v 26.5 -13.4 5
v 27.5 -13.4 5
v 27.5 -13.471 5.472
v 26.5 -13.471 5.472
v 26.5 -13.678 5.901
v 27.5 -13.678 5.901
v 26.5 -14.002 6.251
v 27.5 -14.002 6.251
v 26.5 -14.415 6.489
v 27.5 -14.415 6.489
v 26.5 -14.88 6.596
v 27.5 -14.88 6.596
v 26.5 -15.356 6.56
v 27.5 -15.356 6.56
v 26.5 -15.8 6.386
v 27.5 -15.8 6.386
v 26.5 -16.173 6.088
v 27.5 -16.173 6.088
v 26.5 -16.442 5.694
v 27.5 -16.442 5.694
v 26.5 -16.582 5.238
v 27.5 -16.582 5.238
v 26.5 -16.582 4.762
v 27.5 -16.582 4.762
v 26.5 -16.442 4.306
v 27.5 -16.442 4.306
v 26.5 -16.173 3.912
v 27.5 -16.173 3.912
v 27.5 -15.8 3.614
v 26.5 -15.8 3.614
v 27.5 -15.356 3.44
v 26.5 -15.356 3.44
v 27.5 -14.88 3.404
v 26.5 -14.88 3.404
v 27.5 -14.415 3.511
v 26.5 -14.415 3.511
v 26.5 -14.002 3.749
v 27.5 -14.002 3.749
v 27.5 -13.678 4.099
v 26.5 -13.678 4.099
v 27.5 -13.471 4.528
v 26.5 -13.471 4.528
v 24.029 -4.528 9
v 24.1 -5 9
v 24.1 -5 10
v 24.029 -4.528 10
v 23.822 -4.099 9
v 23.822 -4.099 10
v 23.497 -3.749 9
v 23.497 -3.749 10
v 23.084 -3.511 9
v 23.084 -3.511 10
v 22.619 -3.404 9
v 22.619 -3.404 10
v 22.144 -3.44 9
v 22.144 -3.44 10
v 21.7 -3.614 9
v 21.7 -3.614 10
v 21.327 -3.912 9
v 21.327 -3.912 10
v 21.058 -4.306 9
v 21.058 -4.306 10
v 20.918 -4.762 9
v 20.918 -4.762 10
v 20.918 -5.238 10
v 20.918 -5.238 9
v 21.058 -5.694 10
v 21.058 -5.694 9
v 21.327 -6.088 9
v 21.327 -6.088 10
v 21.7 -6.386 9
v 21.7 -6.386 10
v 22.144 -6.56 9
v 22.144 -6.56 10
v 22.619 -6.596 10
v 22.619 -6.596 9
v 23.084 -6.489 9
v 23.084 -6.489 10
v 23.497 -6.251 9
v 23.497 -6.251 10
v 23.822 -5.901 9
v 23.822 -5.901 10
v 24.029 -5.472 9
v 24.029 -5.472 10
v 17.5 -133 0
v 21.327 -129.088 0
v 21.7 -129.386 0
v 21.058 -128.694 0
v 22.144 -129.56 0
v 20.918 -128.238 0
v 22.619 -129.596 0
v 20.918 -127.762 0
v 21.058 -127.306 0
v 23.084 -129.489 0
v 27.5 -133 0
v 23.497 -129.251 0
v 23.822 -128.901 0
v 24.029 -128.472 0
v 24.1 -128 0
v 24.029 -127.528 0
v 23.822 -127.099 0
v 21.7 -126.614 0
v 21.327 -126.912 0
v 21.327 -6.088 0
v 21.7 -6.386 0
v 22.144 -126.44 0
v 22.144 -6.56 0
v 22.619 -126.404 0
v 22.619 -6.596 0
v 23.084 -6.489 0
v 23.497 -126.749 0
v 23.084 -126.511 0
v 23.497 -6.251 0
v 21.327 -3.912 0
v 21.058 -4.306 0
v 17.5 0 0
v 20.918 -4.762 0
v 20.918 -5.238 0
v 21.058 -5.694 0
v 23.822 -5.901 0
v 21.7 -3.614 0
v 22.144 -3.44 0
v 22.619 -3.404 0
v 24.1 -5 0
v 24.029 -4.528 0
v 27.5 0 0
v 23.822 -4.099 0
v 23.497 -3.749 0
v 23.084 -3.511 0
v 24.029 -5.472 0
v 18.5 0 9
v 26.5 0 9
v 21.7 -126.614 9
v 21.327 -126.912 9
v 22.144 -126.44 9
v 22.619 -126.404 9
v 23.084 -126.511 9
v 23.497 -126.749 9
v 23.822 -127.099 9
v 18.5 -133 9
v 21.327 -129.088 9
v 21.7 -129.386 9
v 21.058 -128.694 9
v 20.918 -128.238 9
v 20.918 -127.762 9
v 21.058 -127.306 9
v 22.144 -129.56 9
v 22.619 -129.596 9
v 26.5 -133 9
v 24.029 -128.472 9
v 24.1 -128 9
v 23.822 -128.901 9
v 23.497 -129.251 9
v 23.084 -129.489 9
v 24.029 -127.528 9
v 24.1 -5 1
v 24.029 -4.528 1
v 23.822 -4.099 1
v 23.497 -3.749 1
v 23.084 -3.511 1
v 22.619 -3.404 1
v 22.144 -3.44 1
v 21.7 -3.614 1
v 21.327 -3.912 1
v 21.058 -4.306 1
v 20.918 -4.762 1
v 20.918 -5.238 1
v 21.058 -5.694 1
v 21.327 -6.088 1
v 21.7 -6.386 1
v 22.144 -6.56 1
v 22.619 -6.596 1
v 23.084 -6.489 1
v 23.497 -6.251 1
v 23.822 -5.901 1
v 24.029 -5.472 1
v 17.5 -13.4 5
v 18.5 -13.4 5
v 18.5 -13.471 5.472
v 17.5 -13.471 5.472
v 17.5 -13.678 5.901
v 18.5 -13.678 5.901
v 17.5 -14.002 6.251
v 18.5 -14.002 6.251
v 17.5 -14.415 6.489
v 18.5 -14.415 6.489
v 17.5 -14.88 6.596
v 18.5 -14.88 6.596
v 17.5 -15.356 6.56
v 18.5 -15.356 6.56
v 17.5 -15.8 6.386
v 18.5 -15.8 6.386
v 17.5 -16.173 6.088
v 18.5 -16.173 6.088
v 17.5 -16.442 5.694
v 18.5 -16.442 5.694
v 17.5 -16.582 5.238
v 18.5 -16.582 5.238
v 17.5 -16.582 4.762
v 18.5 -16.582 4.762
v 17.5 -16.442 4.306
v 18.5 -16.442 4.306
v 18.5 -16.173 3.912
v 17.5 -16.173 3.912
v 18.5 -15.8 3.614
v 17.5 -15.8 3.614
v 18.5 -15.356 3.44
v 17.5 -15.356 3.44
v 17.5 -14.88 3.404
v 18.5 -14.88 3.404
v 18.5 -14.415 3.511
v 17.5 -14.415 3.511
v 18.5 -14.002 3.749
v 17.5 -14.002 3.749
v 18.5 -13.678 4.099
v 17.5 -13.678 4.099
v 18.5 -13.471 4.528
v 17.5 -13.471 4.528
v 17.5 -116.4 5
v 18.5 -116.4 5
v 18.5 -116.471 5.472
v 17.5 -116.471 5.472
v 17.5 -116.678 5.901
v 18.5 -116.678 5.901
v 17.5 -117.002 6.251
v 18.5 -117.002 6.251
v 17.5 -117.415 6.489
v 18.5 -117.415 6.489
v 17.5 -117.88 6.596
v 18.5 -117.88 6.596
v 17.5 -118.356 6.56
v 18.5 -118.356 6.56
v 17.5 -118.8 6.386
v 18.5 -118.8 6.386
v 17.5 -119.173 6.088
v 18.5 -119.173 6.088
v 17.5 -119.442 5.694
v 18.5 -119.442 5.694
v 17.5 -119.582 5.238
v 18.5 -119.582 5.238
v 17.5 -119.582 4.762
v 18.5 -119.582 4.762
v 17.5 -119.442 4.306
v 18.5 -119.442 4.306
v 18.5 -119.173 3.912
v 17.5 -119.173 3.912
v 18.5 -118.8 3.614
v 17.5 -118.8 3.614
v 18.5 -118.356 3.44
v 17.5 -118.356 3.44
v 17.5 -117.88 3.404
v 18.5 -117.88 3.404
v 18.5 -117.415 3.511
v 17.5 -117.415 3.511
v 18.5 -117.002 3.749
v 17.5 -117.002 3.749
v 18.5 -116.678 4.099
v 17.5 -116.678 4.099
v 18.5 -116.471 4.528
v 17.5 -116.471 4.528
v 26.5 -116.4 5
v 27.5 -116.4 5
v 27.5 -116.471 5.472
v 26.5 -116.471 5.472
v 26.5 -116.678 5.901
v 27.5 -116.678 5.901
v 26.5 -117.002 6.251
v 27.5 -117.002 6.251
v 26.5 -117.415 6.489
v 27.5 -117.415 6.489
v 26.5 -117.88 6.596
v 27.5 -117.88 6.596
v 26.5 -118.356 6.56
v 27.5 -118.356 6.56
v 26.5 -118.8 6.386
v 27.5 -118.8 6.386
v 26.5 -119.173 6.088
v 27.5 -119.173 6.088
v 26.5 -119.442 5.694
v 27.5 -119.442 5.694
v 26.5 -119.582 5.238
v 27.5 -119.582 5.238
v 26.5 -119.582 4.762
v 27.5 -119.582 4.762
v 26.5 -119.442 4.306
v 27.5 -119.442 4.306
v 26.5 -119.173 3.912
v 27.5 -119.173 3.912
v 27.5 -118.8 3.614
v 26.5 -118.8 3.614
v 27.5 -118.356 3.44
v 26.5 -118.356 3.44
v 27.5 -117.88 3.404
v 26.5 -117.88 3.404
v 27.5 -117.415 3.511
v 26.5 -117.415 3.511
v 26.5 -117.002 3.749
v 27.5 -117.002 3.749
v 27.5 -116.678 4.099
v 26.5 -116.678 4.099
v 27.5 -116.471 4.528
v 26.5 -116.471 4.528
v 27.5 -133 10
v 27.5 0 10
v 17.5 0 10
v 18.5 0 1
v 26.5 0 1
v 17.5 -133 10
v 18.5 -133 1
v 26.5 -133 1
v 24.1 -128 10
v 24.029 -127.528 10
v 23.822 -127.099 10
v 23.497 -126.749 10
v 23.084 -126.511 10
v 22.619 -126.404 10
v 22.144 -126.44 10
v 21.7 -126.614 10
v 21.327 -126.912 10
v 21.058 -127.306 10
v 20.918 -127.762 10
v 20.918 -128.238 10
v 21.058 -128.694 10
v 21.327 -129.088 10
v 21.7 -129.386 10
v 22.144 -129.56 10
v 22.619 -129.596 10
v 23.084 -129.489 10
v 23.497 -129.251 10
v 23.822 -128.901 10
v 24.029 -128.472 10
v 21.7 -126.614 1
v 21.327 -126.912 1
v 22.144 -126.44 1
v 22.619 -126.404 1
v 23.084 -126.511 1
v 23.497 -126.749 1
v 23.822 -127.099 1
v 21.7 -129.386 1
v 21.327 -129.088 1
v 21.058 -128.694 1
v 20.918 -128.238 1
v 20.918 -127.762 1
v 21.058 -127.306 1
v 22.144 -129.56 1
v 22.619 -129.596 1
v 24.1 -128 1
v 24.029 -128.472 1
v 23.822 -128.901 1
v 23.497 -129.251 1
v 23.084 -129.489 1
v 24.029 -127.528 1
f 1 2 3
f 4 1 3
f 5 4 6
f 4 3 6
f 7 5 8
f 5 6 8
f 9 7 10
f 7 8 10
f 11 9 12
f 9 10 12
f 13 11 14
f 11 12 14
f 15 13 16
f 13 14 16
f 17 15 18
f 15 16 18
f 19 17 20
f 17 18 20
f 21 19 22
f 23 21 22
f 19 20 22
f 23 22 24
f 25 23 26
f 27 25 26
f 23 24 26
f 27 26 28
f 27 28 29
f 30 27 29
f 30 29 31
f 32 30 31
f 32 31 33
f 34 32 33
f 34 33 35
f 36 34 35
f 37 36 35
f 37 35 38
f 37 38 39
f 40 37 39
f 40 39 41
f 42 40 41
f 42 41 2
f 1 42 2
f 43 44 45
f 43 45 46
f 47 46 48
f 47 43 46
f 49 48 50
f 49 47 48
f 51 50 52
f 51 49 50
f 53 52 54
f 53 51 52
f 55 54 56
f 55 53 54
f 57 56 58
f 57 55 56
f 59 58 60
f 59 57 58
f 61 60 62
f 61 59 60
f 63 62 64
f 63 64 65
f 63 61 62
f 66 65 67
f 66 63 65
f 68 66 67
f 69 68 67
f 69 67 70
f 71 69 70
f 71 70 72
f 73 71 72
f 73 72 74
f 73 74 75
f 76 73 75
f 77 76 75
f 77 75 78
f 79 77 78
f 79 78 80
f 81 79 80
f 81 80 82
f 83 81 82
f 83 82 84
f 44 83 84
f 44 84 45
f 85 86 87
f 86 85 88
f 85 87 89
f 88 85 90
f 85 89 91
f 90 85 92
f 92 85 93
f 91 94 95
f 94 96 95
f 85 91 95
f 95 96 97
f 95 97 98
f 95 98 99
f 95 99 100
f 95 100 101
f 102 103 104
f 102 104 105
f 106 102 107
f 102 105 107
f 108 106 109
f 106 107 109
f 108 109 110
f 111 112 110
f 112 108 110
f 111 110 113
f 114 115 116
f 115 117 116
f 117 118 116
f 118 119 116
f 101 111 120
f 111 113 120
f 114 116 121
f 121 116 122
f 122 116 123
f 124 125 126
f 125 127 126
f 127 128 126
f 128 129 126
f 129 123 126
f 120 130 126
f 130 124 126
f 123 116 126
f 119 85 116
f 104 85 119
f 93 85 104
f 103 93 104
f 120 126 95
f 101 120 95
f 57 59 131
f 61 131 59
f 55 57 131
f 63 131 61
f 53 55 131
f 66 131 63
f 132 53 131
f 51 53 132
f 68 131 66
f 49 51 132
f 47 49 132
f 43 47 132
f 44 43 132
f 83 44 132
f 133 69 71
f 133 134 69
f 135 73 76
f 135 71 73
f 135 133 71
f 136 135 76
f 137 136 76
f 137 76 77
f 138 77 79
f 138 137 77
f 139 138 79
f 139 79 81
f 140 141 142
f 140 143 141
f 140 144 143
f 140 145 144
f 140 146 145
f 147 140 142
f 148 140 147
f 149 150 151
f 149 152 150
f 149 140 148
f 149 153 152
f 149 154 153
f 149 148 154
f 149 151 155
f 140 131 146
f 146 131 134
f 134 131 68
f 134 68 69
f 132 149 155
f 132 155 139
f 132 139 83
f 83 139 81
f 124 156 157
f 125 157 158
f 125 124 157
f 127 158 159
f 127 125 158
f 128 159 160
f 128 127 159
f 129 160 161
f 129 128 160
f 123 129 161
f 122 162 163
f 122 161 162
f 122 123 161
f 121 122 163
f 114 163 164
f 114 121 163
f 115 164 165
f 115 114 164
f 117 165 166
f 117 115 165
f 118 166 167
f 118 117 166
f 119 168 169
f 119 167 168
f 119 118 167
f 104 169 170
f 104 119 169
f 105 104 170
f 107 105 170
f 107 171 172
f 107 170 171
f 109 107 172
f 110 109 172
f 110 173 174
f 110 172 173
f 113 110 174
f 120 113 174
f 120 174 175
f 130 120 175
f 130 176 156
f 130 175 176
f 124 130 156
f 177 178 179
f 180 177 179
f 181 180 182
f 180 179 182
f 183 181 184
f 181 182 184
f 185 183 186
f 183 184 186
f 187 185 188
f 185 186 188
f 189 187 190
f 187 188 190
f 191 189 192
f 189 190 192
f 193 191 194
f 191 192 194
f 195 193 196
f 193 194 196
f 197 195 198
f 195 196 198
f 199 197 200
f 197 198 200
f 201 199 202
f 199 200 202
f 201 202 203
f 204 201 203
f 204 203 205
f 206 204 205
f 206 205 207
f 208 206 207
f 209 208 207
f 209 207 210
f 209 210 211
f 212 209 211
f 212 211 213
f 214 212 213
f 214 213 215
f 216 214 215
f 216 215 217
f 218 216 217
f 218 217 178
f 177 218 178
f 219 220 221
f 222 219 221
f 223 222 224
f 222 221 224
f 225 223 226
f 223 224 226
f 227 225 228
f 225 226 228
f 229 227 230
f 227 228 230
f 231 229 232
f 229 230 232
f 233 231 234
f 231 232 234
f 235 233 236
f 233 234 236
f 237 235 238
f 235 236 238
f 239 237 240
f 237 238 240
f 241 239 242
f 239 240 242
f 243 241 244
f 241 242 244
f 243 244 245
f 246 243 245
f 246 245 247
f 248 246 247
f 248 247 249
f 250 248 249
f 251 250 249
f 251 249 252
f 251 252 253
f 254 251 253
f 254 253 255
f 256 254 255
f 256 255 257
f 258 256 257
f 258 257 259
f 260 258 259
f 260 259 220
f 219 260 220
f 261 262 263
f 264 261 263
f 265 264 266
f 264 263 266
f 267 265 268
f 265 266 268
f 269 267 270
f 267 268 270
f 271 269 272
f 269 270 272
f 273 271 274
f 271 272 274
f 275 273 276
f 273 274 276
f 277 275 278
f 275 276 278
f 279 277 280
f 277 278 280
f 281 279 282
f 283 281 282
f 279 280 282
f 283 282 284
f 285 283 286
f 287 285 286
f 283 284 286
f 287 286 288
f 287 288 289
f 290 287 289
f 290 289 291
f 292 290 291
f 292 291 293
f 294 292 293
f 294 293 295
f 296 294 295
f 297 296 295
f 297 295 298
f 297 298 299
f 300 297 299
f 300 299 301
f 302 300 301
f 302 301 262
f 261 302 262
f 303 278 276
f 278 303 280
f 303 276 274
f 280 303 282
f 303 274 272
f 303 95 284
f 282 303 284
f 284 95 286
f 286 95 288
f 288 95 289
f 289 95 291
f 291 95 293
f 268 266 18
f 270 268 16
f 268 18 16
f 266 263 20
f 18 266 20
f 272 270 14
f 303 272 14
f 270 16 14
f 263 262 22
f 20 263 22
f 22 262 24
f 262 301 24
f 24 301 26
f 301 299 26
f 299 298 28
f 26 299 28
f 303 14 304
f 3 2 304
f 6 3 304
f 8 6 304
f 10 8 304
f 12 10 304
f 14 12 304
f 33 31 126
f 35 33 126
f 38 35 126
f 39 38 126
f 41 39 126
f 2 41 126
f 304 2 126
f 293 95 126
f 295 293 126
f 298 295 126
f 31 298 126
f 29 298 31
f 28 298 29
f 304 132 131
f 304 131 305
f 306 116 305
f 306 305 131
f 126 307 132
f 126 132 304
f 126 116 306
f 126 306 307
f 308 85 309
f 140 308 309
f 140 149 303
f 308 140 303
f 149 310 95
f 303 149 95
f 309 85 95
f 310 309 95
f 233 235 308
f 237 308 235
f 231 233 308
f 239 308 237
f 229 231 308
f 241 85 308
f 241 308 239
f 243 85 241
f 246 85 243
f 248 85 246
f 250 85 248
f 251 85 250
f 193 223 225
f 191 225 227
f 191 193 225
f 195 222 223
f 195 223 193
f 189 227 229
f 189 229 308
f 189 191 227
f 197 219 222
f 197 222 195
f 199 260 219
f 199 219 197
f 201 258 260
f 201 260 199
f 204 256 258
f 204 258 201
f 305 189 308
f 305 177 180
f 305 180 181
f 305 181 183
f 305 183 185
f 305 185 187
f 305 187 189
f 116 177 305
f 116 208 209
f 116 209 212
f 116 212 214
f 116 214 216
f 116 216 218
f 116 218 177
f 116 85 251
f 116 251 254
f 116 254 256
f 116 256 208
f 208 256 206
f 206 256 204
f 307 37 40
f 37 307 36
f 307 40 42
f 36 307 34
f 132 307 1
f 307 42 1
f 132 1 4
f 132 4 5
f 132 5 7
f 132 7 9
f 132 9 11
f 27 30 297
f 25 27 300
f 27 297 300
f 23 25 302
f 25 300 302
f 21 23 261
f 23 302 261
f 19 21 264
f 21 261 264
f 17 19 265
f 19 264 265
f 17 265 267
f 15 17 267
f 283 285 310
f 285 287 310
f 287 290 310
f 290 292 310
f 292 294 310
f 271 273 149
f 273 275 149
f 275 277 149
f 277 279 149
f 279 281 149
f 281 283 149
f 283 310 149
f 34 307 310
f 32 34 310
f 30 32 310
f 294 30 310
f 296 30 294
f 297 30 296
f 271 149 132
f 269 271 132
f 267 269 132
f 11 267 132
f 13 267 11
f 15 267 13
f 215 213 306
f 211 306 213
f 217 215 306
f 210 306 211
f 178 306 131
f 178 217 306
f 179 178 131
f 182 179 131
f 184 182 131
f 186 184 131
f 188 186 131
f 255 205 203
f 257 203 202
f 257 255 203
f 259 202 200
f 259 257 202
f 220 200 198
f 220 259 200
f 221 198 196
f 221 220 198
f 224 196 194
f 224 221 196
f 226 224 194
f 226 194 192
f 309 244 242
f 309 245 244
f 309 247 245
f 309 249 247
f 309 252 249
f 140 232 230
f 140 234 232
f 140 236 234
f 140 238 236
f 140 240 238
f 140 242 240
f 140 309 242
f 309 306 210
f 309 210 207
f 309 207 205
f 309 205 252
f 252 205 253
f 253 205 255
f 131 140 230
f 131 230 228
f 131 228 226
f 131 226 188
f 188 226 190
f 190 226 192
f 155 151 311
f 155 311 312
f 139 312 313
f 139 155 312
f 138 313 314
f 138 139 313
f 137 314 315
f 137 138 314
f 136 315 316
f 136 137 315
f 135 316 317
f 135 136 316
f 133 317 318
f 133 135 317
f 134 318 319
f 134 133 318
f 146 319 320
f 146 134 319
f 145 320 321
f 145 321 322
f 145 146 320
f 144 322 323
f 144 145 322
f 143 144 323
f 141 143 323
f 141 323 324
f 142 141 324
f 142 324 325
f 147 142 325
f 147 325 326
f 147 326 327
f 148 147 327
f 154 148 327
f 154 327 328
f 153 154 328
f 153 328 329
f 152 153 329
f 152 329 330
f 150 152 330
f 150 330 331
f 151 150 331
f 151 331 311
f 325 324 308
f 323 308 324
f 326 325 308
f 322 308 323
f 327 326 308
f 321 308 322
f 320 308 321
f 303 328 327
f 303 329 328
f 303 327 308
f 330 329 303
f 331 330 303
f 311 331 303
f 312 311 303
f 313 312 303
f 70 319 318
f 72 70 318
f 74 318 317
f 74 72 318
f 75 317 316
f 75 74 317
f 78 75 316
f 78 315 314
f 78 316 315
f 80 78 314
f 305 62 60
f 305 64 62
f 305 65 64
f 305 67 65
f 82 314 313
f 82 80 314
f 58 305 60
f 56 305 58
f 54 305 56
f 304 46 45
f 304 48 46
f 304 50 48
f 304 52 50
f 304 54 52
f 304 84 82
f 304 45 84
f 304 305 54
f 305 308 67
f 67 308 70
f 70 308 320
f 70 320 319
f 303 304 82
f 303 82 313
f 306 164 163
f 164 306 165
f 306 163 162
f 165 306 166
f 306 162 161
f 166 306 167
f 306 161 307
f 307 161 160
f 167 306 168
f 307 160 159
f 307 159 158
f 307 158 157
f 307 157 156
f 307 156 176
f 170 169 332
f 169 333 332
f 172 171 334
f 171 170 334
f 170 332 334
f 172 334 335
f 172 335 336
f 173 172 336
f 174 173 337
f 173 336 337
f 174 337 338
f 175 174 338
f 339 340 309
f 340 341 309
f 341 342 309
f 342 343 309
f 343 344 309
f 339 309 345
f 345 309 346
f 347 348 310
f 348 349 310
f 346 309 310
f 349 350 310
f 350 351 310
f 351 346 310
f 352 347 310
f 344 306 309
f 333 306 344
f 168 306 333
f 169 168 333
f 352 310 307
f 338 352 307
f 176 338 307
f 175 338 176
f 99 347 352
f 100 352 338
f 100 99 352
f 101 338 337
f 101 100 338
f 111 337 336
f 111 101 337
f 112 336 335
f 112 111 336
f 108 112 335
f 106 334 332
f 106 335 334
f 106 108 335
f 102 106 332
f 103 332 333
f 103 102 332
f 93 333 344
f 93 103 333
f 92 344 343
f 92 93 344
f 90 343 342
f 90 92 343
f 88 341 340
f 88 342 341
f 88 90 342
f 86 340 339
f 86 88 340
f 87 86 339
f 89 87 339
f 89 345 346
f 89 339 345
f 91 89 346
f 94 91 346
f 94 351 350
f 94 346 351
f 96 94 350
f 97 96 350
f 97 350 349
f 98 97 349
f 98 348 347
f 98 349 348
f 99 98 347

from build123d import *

# Parameters (mm, degrees)
SKETCH_1_W          = 10
SKETCH_1_H          = 133
SKETCH_1_R          = 1.6
EXTRUDE_1_DEPTH     = 10
SKETCH_2_R          = 1.6
CUT_EXTRUDE_1_DEPTH = 15
SKETCH_3_W          = 8
SKETCH_3_H          = 8
CUT_EXTRUDE_2_DEPTH = 1000


with BuildPart() as part:
    # ｽｹｯﾁ1 → ﾎﾞｽ - 押し出し1 (new body)
    with BuildSketch(Plane.XY):
        with Locations((22.499828612, -66.5)):
            Rectangle(SKETCH_1_W, SKETCH_1_H)
        with Locations((22.499828612, -5)):
            Circle(SKETCH_1_R, mode=Mode.SUBTRACT)
        with Locations((22.499828612, -128)):
            Circle(SKETCH_1_R, mode=Mode.SUBTRACT)
    extrude(amount=EXTRUDE_1_DEPTH)

    # ｽｹｯﾁ2 → ｶｯﾄ - 押し出し1 (cut)
    with BuildSketch(Plane(origin=(27.499828612, 0, 0), x_dir=(0, 0, -1), z_dir=(1, 0, 0))):
        with Locations(Location((-5, -118, 0), (0, 0, 90))):
            Circle(SKETCH_2_R)
        with Locations(Location((-5, -15, 0), (0, 0, 90))):
            Circle(SKETCH_2_R)
    extrude(amount=-CUT_EXTRUDE_1_DEPTH, mode=Mode.SUBTRACT)

    # ｽｹｯﾁ3 → ｶｯﾄ - 押し出し2 (cut)
    with BuildSketch(Plane.XZ.offset(133)):
        with Locations((22.499828612, 5)):
            Rectangle(SKETCH_3_W, SKETCH_3_H)
    extrude(amount=-CUT_EXTRUDE_2_DEPTH, mode=Mode.SUBTRACT)


solid = part.part
